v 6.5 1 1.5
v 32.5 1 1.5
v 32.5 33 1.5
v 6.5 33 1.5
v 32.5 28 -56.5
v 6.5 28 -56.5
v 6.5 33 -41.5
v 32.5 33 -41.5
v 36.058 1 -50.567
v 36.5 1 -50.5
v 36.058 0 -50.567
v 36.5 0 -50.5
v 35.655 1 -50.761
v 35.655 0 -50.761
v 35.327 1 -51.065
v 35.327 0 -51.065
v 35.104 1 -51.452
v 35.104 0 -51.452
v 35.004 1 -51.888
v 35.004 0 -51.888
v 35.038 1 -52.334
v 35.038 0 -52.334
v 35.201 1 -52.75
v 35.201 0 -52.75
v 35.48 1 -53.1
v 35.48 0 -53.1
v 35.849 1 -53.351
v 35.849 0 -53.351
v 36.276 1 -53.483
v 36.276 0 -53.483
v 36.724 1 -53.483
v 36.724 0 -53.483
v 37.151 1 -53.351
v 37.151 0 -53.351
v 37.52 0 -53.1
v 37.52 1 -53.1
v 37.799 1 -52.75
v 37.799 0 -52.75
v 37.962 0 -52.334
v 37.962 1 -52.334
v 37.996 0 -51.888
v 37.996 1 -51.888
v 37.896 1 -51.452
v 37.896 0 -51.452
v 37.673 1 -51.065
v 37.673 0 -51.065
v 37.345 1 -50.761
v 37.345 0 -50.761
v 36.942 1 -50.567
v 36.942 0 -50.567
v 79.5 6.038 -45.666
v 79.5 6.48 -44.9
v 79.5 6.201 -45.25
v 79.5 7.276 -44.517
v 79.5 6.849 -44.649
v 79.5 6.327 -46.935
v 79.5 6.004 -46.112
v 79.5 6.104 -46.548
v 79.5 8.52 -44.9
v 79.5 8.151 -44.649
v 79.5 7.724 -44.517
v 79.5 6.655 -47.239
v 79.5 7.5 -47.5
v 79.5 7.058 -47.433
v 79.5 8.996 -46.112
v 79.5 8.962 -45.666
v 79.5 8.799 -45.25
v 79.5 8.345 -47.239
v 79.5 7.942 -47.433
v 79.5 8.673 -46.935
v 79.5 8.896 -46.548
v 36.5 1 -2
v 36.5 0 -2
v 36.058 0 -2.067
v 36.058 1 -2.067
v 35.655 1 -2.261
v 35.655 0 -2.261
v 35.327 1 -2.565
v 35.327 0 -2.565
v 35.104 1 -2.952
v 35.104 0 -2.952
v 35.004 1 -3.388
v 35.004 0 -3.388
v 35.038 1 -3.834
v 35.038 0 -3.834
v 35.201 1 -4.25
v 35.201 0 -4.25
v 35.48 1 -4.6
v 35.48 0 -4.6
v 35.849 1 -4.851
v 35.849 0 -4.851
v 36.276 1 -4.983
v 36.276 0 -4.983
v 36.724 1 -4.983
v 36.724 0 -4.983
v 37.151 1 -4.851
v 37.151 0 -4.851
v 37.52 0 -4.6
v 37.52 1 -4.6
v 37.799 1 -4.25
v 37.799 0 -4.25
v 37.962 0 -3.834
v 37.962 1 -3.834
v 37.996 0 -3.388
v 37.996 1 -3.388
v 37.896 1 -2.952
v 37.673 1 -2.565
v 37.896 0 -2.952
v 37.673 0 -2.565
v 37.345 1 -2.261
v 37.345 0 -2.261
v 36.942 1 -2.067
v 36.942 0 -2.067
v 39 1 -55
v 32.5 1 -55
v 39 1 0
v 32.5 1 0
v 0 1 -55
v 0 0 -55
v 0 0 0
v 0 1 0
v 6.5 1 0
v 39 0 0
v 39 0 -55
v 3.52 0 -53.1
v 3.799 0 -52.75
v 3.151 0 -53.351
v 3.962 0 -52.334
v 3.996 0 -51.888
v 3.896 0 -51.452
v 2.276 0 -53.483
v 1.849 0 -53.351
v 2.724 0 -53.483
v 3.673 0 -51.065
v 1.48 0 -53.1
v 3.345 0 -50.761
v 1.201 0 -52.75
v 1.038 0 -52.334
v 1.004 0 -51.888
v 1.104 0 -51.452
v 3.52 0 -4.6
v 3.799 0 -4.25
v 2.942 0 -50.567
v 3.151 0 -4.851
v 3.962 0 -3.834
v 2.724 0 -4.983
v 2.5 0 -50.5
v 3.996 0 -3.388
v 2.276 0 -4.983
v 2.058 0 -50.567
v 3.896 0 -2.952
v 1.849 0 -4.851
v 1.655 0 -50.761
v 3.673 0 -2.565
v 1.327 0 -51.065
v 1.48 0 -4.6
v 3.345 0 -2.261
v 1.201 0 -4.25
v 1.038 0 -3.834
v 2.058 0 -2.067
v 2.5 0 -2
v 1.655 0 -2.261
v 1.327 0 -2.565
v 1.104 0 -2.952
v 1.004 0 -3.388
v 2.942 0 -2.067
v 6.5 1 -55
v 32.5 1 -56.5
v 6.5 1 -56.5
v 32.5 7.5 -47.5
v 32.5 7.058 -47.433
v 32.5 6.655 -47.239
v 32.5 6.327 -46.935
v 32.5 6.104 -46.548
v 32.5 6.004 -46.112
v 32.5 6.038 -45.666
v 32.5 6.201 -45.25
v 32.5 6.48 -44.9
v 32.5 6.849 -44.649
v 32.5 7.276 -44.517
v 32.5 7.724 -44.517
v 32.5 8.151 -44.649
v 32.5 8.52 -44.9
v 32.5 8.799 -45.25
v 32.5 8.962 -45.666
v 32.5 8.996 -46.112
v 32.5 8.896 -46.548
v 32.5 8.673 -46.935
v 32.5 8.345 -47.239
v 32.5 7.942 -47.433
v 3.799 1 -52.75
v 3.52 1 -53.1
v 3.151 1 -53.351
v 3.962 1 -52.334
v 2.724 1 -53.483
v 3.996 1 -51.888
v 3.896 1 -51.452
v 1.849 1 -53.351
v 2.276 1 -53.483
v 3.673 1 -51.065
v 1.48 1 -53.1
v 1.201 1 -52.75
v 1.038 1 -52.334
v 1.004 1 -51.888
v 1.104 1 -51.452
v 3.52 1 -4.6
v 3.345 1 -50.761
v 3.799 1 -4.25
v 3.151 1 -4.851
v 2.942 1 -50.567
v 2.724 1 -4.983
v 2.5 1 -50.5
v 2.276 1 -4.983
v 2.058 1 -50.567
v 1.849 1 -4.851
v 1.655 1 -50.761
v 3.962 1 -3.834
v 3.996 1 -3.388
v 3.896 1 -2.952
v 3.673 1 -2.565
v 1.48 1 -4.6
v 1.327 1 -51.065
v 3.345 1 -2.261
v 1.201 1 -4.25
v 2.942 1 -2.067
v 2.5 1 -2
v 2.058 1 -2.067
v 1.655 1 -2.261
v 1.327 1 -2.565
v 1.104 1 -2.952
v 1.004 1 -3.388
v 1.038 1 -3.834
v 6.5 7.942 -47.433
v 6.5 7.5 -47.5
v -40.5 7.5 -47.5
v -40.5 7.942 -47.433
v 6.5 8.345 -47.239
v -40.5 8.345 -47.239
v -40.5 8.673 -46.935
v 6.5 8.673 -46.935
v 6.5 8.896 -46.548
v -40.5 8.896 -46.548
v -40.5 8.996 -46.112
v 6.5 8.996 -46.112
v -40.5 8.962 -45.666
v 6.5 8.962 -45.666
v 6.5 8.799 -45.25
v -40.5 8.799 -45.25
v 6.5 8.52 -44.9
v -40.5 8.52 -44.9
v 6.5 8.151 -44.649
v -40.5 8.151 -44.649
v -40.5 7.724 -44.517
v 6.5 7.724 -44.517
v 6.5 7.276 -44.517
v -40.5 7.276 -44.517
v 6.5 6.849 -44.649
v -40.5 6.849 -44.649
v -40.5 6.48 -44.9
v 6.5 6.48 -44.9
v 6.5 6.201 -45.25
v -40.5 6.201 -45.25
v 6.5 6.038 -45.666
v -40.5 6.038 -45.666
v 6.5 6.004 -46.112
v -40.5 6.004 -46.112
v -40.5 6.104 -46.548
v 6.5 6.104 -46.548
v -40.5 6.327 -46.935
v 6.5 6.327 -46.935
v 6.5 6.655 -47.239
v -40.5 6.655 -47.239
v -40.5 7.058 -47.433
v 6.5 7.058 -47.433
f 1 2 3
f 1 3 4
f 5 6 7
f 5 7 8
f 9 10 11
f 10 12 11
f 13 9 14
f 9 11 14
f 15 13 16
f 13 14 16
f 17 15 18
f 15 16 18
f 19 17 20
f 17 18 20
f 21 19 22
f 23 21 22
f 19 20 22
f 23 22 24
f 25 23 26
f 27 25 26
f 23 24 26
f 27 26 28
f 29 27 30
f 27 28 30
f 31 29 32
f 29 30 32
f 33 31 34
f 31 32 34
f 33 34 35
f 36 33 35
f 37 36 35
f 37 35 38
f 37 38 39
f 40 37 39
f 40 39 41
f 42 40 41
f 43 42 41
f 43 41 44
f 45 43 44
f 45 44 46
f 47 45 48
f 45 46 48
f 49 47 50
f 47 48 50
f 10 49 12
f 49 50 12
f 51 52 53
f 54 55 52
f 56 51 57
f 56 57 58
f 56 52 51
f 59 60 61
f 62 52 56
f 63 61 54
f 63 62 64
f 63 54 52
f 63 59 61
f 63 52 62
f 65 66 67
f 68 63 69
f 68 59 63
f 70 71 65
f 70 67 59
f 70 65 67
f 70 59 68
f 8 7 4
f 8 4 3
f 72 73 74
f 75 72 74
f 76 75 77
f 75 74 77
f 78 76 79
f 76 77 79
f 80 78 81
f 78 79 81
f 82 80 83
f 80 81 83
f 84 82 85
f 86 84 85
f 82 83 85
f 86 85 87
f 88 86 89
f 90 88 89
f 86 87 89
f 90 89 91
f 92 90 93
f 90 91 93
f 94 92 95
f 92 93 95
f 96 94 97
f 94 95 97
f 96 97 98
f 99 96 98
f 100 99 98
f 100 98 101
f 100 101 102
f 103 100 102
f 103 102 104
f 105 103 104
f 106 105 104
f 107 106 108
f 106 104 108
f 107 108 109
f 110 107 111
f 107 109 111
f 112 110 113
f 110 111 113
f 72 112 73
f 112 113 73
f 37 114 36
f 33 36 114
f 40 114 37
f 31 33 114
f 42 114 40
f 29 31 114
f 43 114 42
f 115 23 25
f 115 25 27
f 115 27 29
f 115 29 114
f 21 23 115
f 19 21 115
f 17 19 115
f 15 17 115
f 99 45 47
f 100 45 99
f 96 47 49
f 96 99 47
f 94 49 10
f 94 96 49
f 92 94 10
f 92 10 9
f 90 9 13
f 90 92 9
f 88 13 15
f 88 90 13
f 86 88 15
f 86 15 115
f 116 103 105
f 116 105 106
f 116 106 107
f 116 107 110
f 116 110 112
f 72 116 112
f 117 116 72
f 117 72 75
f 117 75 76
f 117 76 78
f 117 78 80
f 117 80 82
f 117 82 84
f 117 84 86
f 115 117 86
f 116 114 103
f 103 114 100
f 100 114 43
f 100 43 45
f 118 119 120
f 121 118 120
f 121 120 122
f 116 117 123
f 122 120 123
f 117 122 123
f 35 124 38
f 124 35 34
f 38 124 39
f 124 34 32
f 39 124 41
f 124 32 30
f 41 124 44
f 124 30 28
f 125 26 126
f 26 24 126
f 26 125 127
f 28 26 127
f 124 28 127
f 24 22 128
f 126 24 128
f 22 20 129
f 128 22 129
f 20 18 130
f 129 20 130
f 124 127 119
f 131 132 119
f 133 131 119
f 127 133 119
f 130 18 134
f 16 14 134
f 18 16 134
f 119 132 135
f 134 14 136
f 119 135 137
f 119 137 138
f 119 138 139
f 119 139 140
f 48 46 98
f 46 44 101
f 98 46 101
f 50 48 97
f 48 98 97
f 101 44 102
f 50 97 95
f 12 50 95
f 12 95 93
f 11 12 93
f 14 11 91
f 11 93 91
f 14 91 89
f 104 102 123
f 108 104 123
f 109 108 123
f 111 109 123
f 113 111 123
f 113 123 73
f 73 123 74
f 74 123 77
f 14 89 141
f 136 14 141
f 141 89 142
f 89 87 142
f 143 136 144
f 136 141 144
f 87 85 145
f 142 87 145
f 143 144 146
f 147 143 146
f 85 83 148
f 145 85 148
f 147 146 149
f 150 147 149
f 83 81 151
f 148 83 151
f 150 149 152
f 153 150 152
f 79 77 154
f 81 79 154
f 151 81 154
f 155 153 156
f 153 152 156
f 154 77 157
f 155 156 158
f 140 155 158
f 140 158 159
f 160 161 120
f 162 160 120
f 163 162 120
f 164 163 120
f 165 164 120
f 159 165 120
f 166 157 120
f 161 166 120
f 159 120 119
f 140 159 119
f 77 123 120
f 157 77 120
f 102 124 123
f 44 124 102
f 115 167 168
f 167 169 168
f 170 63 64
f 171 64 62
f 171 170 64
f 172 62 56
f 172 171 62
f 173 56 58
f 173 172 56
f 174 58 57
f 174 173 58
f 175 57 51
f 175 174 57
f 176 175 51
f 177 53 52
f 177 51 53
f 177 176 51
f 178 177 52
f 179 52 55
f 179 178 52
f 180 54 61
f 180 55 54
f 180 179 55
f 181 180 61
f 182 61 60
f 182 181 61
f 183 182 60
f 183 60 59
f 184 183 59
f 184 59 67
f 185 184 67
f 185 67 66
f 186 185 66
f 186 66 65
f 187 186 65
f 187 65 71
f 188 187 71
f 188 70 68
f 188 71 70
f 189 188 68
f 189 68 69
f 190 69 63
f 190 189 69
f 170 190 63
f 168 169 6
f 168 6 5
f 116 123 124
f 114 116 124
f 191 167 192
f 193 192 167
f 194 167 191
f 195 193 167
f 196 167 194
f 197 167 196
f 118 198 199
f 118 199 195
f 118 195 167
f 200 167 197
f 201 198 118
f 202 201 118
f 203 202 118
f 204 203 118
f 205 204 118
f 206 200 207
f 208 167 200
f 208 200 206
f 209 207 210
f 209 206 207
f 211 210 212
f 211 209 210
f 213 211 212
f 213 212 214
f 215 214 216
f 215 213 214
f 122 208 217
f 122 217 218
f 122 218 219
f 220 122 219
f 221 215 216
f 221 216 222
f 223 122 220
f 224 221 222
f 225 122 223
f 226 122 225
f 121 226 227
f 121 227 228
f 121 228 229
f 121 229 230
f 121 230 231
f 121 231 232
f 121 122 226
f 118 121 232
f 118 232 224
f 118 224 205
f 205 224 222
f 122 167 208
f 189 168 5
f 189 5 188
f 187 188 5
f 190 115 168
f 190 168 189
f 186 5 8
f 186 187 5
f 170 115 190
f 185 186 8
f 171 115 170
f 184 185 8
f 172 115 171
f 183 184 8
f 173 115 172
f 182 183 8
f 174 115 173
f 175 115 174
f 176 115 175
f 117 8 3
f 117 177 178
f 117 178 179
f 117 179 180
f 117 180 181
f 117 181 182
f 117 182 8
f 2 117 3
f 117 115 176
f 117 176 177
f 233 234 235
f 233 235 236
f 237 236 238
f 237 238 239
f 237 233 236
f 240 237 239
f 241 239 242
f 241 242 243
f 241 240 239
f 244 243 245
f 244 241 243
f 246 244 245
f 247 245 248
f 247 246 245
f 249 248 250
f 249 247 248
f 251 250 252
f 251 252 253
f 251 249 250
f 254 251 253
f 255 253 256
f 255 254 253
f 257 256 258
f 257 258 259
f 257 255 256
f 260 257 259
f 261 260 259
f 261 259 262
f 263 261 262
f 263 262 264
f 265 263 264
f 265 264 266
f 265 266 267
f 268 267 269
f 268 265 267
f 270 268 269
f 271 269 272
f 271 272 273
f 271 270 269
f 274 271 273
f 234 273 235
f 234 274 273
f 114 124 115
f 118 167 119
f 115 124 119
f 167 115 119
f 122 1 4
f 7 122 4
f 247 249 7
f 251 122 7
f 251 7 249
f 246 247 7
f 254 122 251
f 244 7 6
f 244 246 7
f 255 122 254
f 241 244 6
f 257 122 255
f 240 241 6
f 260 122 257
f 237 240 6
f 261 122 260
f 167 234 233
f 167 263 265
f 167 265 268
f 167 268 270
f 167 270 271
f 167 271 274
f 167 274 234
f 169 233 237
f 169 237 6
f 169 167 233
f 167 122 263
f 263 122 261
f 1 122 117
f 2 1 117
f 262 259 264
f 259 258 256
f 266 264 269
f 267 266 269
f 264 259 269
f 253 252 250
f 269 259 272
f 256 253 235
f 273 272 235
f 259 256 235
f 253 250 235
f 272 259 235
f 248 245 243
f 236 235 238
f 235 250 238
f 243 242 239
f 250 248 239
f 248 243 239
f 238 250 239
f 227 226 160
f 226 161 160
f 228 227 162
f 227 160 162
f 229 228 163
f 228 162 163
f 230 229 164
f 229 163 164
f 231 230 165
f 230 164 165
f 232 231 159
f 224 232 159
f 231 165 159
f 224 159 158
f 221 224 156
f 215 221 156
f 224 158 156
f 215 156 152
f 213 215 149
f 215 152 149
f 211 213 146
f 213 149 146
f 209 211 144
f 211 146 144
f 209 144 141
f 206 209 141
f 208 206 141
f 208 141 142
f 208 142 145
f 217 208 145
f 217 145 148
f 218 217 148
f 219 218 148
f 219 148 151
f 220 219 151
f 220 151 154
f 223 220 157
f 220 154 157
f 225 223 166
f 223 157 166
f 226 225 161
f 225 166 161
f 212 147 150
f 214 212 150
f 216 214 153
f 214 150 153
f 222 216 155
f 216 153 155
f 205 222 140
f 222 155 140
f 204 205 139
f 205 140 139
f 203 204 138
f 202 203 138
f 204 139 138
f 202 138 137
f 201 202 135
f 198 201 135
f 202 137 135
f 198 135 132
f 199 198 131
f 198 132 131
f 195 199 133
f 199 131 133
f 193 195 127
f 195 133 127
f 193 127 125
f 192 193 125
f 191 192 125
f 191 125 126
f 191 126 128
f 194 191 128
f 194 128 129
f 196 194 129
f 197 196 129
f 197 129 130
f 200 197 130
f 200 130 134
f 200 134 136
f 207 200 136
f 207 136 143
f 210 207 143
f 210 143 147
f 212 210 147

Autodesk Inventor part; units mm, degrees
ref_plane "YZ Plane" through (0, 0, 0) normal (1, 0, 0) x (0, 1, 0)
ref_plane "XZ Plane" through (0, 0, 0) normal (0, 1, 0) x (-1, 0, 0)
sketch "Sketch1" plane through (0, 0, 0) normal (0, 1, 0) x (-1, 0, 0)
  line L0 (0, 0) -> (-39, 0)
  line L1 (-39, 0) -> (-39, -55)
  line L2 (-39, -55) -> (0, -55)
  line L3 (0, -55) -> (0, 0)
  dimension "d228" = 39
  dimension "d229" = 55
extrude "Extrusion1" add sketch "Sketch1" along normal blind 1
sketch "Sketch2" plane through (0, 1, 0) normal (0, 1, 0) x (1, 0, 0)
  circle A0 centre (2.5, 3.5) radius 1.5
  circle A1 centre (36.5, 3.5) radius 1.5
  circle A2 centre (2.5, 52) radius 1.5
  circle A3 centre (36.5, 52) radius 1.5
  line L0 (0, 55) -> (0, 0) projected
  line L1 (39, 55) -> (0, 55) projected
  line L2 (39, 0) -> (39, 55) projected
  dimension "d232" = 3
  dimension "d236" = 3.5
  dimension "d237" = 2.5
  dimension "d238" = 3
  dimension "d239" = 2.5
hole "Hole1" at (2.5, 1, -3.5) at (2.5, 1, -52) at (36.5, 1, -52) at (36.5, 1, -3.5) direction (0, -1, 0) diameter 3 end through all
sketch "Sketch3" plane through (0, 1, 0) normal (0, 1, 0) x (1, 0, 0)
  line L0 (0, 0) -> (39, 0) projected
  line L1 (39, 55) -> (0, 55) projected
  line L2 (6.5, 56.5) -> (32.5, 56.5)
  line L3 (32.5, 56.5) -> (32.5, -1.5)
  line L4 (32.5, -1.5) -> (6.5, -1.5)
  line L5 (6.5, -1.5) -> (6.5, 56.5)
  dimension "d257" = 26
  dimension "d258" = 58
  dimension "d259" = 6.5
  dimension "d260" = 1.5
extrude "Extrusion2" add sketch "Sketch3" along normal blind 32
chamfer "Chamfer1" distance 15 distance2 5 1 edges at (19.5, 33, -56.5) measured on face at (15.1667, 33, -37.1667)
ref_plane "Work Plane" through (19.5, 1, 0) normal (1, 0, 0) x (0, 0, -1)
sketch "Sketch4" plane through (19.5, 1, 0) normal (1, 0, 0) x (0, 0, -1)
  circle A0 centre (46, 6.5) radius 1.5
  line L0 (56.5, 0) -> (56.5, 27) projected
  line L1 (0, 0) -> (55, 0) projected
  point P0 (0, -1)
  dimension "d272" = 3
  dimension "d273" = 10.5
  dimension "d274" = 6.5
extrude "Extrusion3" add sketch "Sketch4" along normal mid plane 120
properties part number "Langbektang houder"
